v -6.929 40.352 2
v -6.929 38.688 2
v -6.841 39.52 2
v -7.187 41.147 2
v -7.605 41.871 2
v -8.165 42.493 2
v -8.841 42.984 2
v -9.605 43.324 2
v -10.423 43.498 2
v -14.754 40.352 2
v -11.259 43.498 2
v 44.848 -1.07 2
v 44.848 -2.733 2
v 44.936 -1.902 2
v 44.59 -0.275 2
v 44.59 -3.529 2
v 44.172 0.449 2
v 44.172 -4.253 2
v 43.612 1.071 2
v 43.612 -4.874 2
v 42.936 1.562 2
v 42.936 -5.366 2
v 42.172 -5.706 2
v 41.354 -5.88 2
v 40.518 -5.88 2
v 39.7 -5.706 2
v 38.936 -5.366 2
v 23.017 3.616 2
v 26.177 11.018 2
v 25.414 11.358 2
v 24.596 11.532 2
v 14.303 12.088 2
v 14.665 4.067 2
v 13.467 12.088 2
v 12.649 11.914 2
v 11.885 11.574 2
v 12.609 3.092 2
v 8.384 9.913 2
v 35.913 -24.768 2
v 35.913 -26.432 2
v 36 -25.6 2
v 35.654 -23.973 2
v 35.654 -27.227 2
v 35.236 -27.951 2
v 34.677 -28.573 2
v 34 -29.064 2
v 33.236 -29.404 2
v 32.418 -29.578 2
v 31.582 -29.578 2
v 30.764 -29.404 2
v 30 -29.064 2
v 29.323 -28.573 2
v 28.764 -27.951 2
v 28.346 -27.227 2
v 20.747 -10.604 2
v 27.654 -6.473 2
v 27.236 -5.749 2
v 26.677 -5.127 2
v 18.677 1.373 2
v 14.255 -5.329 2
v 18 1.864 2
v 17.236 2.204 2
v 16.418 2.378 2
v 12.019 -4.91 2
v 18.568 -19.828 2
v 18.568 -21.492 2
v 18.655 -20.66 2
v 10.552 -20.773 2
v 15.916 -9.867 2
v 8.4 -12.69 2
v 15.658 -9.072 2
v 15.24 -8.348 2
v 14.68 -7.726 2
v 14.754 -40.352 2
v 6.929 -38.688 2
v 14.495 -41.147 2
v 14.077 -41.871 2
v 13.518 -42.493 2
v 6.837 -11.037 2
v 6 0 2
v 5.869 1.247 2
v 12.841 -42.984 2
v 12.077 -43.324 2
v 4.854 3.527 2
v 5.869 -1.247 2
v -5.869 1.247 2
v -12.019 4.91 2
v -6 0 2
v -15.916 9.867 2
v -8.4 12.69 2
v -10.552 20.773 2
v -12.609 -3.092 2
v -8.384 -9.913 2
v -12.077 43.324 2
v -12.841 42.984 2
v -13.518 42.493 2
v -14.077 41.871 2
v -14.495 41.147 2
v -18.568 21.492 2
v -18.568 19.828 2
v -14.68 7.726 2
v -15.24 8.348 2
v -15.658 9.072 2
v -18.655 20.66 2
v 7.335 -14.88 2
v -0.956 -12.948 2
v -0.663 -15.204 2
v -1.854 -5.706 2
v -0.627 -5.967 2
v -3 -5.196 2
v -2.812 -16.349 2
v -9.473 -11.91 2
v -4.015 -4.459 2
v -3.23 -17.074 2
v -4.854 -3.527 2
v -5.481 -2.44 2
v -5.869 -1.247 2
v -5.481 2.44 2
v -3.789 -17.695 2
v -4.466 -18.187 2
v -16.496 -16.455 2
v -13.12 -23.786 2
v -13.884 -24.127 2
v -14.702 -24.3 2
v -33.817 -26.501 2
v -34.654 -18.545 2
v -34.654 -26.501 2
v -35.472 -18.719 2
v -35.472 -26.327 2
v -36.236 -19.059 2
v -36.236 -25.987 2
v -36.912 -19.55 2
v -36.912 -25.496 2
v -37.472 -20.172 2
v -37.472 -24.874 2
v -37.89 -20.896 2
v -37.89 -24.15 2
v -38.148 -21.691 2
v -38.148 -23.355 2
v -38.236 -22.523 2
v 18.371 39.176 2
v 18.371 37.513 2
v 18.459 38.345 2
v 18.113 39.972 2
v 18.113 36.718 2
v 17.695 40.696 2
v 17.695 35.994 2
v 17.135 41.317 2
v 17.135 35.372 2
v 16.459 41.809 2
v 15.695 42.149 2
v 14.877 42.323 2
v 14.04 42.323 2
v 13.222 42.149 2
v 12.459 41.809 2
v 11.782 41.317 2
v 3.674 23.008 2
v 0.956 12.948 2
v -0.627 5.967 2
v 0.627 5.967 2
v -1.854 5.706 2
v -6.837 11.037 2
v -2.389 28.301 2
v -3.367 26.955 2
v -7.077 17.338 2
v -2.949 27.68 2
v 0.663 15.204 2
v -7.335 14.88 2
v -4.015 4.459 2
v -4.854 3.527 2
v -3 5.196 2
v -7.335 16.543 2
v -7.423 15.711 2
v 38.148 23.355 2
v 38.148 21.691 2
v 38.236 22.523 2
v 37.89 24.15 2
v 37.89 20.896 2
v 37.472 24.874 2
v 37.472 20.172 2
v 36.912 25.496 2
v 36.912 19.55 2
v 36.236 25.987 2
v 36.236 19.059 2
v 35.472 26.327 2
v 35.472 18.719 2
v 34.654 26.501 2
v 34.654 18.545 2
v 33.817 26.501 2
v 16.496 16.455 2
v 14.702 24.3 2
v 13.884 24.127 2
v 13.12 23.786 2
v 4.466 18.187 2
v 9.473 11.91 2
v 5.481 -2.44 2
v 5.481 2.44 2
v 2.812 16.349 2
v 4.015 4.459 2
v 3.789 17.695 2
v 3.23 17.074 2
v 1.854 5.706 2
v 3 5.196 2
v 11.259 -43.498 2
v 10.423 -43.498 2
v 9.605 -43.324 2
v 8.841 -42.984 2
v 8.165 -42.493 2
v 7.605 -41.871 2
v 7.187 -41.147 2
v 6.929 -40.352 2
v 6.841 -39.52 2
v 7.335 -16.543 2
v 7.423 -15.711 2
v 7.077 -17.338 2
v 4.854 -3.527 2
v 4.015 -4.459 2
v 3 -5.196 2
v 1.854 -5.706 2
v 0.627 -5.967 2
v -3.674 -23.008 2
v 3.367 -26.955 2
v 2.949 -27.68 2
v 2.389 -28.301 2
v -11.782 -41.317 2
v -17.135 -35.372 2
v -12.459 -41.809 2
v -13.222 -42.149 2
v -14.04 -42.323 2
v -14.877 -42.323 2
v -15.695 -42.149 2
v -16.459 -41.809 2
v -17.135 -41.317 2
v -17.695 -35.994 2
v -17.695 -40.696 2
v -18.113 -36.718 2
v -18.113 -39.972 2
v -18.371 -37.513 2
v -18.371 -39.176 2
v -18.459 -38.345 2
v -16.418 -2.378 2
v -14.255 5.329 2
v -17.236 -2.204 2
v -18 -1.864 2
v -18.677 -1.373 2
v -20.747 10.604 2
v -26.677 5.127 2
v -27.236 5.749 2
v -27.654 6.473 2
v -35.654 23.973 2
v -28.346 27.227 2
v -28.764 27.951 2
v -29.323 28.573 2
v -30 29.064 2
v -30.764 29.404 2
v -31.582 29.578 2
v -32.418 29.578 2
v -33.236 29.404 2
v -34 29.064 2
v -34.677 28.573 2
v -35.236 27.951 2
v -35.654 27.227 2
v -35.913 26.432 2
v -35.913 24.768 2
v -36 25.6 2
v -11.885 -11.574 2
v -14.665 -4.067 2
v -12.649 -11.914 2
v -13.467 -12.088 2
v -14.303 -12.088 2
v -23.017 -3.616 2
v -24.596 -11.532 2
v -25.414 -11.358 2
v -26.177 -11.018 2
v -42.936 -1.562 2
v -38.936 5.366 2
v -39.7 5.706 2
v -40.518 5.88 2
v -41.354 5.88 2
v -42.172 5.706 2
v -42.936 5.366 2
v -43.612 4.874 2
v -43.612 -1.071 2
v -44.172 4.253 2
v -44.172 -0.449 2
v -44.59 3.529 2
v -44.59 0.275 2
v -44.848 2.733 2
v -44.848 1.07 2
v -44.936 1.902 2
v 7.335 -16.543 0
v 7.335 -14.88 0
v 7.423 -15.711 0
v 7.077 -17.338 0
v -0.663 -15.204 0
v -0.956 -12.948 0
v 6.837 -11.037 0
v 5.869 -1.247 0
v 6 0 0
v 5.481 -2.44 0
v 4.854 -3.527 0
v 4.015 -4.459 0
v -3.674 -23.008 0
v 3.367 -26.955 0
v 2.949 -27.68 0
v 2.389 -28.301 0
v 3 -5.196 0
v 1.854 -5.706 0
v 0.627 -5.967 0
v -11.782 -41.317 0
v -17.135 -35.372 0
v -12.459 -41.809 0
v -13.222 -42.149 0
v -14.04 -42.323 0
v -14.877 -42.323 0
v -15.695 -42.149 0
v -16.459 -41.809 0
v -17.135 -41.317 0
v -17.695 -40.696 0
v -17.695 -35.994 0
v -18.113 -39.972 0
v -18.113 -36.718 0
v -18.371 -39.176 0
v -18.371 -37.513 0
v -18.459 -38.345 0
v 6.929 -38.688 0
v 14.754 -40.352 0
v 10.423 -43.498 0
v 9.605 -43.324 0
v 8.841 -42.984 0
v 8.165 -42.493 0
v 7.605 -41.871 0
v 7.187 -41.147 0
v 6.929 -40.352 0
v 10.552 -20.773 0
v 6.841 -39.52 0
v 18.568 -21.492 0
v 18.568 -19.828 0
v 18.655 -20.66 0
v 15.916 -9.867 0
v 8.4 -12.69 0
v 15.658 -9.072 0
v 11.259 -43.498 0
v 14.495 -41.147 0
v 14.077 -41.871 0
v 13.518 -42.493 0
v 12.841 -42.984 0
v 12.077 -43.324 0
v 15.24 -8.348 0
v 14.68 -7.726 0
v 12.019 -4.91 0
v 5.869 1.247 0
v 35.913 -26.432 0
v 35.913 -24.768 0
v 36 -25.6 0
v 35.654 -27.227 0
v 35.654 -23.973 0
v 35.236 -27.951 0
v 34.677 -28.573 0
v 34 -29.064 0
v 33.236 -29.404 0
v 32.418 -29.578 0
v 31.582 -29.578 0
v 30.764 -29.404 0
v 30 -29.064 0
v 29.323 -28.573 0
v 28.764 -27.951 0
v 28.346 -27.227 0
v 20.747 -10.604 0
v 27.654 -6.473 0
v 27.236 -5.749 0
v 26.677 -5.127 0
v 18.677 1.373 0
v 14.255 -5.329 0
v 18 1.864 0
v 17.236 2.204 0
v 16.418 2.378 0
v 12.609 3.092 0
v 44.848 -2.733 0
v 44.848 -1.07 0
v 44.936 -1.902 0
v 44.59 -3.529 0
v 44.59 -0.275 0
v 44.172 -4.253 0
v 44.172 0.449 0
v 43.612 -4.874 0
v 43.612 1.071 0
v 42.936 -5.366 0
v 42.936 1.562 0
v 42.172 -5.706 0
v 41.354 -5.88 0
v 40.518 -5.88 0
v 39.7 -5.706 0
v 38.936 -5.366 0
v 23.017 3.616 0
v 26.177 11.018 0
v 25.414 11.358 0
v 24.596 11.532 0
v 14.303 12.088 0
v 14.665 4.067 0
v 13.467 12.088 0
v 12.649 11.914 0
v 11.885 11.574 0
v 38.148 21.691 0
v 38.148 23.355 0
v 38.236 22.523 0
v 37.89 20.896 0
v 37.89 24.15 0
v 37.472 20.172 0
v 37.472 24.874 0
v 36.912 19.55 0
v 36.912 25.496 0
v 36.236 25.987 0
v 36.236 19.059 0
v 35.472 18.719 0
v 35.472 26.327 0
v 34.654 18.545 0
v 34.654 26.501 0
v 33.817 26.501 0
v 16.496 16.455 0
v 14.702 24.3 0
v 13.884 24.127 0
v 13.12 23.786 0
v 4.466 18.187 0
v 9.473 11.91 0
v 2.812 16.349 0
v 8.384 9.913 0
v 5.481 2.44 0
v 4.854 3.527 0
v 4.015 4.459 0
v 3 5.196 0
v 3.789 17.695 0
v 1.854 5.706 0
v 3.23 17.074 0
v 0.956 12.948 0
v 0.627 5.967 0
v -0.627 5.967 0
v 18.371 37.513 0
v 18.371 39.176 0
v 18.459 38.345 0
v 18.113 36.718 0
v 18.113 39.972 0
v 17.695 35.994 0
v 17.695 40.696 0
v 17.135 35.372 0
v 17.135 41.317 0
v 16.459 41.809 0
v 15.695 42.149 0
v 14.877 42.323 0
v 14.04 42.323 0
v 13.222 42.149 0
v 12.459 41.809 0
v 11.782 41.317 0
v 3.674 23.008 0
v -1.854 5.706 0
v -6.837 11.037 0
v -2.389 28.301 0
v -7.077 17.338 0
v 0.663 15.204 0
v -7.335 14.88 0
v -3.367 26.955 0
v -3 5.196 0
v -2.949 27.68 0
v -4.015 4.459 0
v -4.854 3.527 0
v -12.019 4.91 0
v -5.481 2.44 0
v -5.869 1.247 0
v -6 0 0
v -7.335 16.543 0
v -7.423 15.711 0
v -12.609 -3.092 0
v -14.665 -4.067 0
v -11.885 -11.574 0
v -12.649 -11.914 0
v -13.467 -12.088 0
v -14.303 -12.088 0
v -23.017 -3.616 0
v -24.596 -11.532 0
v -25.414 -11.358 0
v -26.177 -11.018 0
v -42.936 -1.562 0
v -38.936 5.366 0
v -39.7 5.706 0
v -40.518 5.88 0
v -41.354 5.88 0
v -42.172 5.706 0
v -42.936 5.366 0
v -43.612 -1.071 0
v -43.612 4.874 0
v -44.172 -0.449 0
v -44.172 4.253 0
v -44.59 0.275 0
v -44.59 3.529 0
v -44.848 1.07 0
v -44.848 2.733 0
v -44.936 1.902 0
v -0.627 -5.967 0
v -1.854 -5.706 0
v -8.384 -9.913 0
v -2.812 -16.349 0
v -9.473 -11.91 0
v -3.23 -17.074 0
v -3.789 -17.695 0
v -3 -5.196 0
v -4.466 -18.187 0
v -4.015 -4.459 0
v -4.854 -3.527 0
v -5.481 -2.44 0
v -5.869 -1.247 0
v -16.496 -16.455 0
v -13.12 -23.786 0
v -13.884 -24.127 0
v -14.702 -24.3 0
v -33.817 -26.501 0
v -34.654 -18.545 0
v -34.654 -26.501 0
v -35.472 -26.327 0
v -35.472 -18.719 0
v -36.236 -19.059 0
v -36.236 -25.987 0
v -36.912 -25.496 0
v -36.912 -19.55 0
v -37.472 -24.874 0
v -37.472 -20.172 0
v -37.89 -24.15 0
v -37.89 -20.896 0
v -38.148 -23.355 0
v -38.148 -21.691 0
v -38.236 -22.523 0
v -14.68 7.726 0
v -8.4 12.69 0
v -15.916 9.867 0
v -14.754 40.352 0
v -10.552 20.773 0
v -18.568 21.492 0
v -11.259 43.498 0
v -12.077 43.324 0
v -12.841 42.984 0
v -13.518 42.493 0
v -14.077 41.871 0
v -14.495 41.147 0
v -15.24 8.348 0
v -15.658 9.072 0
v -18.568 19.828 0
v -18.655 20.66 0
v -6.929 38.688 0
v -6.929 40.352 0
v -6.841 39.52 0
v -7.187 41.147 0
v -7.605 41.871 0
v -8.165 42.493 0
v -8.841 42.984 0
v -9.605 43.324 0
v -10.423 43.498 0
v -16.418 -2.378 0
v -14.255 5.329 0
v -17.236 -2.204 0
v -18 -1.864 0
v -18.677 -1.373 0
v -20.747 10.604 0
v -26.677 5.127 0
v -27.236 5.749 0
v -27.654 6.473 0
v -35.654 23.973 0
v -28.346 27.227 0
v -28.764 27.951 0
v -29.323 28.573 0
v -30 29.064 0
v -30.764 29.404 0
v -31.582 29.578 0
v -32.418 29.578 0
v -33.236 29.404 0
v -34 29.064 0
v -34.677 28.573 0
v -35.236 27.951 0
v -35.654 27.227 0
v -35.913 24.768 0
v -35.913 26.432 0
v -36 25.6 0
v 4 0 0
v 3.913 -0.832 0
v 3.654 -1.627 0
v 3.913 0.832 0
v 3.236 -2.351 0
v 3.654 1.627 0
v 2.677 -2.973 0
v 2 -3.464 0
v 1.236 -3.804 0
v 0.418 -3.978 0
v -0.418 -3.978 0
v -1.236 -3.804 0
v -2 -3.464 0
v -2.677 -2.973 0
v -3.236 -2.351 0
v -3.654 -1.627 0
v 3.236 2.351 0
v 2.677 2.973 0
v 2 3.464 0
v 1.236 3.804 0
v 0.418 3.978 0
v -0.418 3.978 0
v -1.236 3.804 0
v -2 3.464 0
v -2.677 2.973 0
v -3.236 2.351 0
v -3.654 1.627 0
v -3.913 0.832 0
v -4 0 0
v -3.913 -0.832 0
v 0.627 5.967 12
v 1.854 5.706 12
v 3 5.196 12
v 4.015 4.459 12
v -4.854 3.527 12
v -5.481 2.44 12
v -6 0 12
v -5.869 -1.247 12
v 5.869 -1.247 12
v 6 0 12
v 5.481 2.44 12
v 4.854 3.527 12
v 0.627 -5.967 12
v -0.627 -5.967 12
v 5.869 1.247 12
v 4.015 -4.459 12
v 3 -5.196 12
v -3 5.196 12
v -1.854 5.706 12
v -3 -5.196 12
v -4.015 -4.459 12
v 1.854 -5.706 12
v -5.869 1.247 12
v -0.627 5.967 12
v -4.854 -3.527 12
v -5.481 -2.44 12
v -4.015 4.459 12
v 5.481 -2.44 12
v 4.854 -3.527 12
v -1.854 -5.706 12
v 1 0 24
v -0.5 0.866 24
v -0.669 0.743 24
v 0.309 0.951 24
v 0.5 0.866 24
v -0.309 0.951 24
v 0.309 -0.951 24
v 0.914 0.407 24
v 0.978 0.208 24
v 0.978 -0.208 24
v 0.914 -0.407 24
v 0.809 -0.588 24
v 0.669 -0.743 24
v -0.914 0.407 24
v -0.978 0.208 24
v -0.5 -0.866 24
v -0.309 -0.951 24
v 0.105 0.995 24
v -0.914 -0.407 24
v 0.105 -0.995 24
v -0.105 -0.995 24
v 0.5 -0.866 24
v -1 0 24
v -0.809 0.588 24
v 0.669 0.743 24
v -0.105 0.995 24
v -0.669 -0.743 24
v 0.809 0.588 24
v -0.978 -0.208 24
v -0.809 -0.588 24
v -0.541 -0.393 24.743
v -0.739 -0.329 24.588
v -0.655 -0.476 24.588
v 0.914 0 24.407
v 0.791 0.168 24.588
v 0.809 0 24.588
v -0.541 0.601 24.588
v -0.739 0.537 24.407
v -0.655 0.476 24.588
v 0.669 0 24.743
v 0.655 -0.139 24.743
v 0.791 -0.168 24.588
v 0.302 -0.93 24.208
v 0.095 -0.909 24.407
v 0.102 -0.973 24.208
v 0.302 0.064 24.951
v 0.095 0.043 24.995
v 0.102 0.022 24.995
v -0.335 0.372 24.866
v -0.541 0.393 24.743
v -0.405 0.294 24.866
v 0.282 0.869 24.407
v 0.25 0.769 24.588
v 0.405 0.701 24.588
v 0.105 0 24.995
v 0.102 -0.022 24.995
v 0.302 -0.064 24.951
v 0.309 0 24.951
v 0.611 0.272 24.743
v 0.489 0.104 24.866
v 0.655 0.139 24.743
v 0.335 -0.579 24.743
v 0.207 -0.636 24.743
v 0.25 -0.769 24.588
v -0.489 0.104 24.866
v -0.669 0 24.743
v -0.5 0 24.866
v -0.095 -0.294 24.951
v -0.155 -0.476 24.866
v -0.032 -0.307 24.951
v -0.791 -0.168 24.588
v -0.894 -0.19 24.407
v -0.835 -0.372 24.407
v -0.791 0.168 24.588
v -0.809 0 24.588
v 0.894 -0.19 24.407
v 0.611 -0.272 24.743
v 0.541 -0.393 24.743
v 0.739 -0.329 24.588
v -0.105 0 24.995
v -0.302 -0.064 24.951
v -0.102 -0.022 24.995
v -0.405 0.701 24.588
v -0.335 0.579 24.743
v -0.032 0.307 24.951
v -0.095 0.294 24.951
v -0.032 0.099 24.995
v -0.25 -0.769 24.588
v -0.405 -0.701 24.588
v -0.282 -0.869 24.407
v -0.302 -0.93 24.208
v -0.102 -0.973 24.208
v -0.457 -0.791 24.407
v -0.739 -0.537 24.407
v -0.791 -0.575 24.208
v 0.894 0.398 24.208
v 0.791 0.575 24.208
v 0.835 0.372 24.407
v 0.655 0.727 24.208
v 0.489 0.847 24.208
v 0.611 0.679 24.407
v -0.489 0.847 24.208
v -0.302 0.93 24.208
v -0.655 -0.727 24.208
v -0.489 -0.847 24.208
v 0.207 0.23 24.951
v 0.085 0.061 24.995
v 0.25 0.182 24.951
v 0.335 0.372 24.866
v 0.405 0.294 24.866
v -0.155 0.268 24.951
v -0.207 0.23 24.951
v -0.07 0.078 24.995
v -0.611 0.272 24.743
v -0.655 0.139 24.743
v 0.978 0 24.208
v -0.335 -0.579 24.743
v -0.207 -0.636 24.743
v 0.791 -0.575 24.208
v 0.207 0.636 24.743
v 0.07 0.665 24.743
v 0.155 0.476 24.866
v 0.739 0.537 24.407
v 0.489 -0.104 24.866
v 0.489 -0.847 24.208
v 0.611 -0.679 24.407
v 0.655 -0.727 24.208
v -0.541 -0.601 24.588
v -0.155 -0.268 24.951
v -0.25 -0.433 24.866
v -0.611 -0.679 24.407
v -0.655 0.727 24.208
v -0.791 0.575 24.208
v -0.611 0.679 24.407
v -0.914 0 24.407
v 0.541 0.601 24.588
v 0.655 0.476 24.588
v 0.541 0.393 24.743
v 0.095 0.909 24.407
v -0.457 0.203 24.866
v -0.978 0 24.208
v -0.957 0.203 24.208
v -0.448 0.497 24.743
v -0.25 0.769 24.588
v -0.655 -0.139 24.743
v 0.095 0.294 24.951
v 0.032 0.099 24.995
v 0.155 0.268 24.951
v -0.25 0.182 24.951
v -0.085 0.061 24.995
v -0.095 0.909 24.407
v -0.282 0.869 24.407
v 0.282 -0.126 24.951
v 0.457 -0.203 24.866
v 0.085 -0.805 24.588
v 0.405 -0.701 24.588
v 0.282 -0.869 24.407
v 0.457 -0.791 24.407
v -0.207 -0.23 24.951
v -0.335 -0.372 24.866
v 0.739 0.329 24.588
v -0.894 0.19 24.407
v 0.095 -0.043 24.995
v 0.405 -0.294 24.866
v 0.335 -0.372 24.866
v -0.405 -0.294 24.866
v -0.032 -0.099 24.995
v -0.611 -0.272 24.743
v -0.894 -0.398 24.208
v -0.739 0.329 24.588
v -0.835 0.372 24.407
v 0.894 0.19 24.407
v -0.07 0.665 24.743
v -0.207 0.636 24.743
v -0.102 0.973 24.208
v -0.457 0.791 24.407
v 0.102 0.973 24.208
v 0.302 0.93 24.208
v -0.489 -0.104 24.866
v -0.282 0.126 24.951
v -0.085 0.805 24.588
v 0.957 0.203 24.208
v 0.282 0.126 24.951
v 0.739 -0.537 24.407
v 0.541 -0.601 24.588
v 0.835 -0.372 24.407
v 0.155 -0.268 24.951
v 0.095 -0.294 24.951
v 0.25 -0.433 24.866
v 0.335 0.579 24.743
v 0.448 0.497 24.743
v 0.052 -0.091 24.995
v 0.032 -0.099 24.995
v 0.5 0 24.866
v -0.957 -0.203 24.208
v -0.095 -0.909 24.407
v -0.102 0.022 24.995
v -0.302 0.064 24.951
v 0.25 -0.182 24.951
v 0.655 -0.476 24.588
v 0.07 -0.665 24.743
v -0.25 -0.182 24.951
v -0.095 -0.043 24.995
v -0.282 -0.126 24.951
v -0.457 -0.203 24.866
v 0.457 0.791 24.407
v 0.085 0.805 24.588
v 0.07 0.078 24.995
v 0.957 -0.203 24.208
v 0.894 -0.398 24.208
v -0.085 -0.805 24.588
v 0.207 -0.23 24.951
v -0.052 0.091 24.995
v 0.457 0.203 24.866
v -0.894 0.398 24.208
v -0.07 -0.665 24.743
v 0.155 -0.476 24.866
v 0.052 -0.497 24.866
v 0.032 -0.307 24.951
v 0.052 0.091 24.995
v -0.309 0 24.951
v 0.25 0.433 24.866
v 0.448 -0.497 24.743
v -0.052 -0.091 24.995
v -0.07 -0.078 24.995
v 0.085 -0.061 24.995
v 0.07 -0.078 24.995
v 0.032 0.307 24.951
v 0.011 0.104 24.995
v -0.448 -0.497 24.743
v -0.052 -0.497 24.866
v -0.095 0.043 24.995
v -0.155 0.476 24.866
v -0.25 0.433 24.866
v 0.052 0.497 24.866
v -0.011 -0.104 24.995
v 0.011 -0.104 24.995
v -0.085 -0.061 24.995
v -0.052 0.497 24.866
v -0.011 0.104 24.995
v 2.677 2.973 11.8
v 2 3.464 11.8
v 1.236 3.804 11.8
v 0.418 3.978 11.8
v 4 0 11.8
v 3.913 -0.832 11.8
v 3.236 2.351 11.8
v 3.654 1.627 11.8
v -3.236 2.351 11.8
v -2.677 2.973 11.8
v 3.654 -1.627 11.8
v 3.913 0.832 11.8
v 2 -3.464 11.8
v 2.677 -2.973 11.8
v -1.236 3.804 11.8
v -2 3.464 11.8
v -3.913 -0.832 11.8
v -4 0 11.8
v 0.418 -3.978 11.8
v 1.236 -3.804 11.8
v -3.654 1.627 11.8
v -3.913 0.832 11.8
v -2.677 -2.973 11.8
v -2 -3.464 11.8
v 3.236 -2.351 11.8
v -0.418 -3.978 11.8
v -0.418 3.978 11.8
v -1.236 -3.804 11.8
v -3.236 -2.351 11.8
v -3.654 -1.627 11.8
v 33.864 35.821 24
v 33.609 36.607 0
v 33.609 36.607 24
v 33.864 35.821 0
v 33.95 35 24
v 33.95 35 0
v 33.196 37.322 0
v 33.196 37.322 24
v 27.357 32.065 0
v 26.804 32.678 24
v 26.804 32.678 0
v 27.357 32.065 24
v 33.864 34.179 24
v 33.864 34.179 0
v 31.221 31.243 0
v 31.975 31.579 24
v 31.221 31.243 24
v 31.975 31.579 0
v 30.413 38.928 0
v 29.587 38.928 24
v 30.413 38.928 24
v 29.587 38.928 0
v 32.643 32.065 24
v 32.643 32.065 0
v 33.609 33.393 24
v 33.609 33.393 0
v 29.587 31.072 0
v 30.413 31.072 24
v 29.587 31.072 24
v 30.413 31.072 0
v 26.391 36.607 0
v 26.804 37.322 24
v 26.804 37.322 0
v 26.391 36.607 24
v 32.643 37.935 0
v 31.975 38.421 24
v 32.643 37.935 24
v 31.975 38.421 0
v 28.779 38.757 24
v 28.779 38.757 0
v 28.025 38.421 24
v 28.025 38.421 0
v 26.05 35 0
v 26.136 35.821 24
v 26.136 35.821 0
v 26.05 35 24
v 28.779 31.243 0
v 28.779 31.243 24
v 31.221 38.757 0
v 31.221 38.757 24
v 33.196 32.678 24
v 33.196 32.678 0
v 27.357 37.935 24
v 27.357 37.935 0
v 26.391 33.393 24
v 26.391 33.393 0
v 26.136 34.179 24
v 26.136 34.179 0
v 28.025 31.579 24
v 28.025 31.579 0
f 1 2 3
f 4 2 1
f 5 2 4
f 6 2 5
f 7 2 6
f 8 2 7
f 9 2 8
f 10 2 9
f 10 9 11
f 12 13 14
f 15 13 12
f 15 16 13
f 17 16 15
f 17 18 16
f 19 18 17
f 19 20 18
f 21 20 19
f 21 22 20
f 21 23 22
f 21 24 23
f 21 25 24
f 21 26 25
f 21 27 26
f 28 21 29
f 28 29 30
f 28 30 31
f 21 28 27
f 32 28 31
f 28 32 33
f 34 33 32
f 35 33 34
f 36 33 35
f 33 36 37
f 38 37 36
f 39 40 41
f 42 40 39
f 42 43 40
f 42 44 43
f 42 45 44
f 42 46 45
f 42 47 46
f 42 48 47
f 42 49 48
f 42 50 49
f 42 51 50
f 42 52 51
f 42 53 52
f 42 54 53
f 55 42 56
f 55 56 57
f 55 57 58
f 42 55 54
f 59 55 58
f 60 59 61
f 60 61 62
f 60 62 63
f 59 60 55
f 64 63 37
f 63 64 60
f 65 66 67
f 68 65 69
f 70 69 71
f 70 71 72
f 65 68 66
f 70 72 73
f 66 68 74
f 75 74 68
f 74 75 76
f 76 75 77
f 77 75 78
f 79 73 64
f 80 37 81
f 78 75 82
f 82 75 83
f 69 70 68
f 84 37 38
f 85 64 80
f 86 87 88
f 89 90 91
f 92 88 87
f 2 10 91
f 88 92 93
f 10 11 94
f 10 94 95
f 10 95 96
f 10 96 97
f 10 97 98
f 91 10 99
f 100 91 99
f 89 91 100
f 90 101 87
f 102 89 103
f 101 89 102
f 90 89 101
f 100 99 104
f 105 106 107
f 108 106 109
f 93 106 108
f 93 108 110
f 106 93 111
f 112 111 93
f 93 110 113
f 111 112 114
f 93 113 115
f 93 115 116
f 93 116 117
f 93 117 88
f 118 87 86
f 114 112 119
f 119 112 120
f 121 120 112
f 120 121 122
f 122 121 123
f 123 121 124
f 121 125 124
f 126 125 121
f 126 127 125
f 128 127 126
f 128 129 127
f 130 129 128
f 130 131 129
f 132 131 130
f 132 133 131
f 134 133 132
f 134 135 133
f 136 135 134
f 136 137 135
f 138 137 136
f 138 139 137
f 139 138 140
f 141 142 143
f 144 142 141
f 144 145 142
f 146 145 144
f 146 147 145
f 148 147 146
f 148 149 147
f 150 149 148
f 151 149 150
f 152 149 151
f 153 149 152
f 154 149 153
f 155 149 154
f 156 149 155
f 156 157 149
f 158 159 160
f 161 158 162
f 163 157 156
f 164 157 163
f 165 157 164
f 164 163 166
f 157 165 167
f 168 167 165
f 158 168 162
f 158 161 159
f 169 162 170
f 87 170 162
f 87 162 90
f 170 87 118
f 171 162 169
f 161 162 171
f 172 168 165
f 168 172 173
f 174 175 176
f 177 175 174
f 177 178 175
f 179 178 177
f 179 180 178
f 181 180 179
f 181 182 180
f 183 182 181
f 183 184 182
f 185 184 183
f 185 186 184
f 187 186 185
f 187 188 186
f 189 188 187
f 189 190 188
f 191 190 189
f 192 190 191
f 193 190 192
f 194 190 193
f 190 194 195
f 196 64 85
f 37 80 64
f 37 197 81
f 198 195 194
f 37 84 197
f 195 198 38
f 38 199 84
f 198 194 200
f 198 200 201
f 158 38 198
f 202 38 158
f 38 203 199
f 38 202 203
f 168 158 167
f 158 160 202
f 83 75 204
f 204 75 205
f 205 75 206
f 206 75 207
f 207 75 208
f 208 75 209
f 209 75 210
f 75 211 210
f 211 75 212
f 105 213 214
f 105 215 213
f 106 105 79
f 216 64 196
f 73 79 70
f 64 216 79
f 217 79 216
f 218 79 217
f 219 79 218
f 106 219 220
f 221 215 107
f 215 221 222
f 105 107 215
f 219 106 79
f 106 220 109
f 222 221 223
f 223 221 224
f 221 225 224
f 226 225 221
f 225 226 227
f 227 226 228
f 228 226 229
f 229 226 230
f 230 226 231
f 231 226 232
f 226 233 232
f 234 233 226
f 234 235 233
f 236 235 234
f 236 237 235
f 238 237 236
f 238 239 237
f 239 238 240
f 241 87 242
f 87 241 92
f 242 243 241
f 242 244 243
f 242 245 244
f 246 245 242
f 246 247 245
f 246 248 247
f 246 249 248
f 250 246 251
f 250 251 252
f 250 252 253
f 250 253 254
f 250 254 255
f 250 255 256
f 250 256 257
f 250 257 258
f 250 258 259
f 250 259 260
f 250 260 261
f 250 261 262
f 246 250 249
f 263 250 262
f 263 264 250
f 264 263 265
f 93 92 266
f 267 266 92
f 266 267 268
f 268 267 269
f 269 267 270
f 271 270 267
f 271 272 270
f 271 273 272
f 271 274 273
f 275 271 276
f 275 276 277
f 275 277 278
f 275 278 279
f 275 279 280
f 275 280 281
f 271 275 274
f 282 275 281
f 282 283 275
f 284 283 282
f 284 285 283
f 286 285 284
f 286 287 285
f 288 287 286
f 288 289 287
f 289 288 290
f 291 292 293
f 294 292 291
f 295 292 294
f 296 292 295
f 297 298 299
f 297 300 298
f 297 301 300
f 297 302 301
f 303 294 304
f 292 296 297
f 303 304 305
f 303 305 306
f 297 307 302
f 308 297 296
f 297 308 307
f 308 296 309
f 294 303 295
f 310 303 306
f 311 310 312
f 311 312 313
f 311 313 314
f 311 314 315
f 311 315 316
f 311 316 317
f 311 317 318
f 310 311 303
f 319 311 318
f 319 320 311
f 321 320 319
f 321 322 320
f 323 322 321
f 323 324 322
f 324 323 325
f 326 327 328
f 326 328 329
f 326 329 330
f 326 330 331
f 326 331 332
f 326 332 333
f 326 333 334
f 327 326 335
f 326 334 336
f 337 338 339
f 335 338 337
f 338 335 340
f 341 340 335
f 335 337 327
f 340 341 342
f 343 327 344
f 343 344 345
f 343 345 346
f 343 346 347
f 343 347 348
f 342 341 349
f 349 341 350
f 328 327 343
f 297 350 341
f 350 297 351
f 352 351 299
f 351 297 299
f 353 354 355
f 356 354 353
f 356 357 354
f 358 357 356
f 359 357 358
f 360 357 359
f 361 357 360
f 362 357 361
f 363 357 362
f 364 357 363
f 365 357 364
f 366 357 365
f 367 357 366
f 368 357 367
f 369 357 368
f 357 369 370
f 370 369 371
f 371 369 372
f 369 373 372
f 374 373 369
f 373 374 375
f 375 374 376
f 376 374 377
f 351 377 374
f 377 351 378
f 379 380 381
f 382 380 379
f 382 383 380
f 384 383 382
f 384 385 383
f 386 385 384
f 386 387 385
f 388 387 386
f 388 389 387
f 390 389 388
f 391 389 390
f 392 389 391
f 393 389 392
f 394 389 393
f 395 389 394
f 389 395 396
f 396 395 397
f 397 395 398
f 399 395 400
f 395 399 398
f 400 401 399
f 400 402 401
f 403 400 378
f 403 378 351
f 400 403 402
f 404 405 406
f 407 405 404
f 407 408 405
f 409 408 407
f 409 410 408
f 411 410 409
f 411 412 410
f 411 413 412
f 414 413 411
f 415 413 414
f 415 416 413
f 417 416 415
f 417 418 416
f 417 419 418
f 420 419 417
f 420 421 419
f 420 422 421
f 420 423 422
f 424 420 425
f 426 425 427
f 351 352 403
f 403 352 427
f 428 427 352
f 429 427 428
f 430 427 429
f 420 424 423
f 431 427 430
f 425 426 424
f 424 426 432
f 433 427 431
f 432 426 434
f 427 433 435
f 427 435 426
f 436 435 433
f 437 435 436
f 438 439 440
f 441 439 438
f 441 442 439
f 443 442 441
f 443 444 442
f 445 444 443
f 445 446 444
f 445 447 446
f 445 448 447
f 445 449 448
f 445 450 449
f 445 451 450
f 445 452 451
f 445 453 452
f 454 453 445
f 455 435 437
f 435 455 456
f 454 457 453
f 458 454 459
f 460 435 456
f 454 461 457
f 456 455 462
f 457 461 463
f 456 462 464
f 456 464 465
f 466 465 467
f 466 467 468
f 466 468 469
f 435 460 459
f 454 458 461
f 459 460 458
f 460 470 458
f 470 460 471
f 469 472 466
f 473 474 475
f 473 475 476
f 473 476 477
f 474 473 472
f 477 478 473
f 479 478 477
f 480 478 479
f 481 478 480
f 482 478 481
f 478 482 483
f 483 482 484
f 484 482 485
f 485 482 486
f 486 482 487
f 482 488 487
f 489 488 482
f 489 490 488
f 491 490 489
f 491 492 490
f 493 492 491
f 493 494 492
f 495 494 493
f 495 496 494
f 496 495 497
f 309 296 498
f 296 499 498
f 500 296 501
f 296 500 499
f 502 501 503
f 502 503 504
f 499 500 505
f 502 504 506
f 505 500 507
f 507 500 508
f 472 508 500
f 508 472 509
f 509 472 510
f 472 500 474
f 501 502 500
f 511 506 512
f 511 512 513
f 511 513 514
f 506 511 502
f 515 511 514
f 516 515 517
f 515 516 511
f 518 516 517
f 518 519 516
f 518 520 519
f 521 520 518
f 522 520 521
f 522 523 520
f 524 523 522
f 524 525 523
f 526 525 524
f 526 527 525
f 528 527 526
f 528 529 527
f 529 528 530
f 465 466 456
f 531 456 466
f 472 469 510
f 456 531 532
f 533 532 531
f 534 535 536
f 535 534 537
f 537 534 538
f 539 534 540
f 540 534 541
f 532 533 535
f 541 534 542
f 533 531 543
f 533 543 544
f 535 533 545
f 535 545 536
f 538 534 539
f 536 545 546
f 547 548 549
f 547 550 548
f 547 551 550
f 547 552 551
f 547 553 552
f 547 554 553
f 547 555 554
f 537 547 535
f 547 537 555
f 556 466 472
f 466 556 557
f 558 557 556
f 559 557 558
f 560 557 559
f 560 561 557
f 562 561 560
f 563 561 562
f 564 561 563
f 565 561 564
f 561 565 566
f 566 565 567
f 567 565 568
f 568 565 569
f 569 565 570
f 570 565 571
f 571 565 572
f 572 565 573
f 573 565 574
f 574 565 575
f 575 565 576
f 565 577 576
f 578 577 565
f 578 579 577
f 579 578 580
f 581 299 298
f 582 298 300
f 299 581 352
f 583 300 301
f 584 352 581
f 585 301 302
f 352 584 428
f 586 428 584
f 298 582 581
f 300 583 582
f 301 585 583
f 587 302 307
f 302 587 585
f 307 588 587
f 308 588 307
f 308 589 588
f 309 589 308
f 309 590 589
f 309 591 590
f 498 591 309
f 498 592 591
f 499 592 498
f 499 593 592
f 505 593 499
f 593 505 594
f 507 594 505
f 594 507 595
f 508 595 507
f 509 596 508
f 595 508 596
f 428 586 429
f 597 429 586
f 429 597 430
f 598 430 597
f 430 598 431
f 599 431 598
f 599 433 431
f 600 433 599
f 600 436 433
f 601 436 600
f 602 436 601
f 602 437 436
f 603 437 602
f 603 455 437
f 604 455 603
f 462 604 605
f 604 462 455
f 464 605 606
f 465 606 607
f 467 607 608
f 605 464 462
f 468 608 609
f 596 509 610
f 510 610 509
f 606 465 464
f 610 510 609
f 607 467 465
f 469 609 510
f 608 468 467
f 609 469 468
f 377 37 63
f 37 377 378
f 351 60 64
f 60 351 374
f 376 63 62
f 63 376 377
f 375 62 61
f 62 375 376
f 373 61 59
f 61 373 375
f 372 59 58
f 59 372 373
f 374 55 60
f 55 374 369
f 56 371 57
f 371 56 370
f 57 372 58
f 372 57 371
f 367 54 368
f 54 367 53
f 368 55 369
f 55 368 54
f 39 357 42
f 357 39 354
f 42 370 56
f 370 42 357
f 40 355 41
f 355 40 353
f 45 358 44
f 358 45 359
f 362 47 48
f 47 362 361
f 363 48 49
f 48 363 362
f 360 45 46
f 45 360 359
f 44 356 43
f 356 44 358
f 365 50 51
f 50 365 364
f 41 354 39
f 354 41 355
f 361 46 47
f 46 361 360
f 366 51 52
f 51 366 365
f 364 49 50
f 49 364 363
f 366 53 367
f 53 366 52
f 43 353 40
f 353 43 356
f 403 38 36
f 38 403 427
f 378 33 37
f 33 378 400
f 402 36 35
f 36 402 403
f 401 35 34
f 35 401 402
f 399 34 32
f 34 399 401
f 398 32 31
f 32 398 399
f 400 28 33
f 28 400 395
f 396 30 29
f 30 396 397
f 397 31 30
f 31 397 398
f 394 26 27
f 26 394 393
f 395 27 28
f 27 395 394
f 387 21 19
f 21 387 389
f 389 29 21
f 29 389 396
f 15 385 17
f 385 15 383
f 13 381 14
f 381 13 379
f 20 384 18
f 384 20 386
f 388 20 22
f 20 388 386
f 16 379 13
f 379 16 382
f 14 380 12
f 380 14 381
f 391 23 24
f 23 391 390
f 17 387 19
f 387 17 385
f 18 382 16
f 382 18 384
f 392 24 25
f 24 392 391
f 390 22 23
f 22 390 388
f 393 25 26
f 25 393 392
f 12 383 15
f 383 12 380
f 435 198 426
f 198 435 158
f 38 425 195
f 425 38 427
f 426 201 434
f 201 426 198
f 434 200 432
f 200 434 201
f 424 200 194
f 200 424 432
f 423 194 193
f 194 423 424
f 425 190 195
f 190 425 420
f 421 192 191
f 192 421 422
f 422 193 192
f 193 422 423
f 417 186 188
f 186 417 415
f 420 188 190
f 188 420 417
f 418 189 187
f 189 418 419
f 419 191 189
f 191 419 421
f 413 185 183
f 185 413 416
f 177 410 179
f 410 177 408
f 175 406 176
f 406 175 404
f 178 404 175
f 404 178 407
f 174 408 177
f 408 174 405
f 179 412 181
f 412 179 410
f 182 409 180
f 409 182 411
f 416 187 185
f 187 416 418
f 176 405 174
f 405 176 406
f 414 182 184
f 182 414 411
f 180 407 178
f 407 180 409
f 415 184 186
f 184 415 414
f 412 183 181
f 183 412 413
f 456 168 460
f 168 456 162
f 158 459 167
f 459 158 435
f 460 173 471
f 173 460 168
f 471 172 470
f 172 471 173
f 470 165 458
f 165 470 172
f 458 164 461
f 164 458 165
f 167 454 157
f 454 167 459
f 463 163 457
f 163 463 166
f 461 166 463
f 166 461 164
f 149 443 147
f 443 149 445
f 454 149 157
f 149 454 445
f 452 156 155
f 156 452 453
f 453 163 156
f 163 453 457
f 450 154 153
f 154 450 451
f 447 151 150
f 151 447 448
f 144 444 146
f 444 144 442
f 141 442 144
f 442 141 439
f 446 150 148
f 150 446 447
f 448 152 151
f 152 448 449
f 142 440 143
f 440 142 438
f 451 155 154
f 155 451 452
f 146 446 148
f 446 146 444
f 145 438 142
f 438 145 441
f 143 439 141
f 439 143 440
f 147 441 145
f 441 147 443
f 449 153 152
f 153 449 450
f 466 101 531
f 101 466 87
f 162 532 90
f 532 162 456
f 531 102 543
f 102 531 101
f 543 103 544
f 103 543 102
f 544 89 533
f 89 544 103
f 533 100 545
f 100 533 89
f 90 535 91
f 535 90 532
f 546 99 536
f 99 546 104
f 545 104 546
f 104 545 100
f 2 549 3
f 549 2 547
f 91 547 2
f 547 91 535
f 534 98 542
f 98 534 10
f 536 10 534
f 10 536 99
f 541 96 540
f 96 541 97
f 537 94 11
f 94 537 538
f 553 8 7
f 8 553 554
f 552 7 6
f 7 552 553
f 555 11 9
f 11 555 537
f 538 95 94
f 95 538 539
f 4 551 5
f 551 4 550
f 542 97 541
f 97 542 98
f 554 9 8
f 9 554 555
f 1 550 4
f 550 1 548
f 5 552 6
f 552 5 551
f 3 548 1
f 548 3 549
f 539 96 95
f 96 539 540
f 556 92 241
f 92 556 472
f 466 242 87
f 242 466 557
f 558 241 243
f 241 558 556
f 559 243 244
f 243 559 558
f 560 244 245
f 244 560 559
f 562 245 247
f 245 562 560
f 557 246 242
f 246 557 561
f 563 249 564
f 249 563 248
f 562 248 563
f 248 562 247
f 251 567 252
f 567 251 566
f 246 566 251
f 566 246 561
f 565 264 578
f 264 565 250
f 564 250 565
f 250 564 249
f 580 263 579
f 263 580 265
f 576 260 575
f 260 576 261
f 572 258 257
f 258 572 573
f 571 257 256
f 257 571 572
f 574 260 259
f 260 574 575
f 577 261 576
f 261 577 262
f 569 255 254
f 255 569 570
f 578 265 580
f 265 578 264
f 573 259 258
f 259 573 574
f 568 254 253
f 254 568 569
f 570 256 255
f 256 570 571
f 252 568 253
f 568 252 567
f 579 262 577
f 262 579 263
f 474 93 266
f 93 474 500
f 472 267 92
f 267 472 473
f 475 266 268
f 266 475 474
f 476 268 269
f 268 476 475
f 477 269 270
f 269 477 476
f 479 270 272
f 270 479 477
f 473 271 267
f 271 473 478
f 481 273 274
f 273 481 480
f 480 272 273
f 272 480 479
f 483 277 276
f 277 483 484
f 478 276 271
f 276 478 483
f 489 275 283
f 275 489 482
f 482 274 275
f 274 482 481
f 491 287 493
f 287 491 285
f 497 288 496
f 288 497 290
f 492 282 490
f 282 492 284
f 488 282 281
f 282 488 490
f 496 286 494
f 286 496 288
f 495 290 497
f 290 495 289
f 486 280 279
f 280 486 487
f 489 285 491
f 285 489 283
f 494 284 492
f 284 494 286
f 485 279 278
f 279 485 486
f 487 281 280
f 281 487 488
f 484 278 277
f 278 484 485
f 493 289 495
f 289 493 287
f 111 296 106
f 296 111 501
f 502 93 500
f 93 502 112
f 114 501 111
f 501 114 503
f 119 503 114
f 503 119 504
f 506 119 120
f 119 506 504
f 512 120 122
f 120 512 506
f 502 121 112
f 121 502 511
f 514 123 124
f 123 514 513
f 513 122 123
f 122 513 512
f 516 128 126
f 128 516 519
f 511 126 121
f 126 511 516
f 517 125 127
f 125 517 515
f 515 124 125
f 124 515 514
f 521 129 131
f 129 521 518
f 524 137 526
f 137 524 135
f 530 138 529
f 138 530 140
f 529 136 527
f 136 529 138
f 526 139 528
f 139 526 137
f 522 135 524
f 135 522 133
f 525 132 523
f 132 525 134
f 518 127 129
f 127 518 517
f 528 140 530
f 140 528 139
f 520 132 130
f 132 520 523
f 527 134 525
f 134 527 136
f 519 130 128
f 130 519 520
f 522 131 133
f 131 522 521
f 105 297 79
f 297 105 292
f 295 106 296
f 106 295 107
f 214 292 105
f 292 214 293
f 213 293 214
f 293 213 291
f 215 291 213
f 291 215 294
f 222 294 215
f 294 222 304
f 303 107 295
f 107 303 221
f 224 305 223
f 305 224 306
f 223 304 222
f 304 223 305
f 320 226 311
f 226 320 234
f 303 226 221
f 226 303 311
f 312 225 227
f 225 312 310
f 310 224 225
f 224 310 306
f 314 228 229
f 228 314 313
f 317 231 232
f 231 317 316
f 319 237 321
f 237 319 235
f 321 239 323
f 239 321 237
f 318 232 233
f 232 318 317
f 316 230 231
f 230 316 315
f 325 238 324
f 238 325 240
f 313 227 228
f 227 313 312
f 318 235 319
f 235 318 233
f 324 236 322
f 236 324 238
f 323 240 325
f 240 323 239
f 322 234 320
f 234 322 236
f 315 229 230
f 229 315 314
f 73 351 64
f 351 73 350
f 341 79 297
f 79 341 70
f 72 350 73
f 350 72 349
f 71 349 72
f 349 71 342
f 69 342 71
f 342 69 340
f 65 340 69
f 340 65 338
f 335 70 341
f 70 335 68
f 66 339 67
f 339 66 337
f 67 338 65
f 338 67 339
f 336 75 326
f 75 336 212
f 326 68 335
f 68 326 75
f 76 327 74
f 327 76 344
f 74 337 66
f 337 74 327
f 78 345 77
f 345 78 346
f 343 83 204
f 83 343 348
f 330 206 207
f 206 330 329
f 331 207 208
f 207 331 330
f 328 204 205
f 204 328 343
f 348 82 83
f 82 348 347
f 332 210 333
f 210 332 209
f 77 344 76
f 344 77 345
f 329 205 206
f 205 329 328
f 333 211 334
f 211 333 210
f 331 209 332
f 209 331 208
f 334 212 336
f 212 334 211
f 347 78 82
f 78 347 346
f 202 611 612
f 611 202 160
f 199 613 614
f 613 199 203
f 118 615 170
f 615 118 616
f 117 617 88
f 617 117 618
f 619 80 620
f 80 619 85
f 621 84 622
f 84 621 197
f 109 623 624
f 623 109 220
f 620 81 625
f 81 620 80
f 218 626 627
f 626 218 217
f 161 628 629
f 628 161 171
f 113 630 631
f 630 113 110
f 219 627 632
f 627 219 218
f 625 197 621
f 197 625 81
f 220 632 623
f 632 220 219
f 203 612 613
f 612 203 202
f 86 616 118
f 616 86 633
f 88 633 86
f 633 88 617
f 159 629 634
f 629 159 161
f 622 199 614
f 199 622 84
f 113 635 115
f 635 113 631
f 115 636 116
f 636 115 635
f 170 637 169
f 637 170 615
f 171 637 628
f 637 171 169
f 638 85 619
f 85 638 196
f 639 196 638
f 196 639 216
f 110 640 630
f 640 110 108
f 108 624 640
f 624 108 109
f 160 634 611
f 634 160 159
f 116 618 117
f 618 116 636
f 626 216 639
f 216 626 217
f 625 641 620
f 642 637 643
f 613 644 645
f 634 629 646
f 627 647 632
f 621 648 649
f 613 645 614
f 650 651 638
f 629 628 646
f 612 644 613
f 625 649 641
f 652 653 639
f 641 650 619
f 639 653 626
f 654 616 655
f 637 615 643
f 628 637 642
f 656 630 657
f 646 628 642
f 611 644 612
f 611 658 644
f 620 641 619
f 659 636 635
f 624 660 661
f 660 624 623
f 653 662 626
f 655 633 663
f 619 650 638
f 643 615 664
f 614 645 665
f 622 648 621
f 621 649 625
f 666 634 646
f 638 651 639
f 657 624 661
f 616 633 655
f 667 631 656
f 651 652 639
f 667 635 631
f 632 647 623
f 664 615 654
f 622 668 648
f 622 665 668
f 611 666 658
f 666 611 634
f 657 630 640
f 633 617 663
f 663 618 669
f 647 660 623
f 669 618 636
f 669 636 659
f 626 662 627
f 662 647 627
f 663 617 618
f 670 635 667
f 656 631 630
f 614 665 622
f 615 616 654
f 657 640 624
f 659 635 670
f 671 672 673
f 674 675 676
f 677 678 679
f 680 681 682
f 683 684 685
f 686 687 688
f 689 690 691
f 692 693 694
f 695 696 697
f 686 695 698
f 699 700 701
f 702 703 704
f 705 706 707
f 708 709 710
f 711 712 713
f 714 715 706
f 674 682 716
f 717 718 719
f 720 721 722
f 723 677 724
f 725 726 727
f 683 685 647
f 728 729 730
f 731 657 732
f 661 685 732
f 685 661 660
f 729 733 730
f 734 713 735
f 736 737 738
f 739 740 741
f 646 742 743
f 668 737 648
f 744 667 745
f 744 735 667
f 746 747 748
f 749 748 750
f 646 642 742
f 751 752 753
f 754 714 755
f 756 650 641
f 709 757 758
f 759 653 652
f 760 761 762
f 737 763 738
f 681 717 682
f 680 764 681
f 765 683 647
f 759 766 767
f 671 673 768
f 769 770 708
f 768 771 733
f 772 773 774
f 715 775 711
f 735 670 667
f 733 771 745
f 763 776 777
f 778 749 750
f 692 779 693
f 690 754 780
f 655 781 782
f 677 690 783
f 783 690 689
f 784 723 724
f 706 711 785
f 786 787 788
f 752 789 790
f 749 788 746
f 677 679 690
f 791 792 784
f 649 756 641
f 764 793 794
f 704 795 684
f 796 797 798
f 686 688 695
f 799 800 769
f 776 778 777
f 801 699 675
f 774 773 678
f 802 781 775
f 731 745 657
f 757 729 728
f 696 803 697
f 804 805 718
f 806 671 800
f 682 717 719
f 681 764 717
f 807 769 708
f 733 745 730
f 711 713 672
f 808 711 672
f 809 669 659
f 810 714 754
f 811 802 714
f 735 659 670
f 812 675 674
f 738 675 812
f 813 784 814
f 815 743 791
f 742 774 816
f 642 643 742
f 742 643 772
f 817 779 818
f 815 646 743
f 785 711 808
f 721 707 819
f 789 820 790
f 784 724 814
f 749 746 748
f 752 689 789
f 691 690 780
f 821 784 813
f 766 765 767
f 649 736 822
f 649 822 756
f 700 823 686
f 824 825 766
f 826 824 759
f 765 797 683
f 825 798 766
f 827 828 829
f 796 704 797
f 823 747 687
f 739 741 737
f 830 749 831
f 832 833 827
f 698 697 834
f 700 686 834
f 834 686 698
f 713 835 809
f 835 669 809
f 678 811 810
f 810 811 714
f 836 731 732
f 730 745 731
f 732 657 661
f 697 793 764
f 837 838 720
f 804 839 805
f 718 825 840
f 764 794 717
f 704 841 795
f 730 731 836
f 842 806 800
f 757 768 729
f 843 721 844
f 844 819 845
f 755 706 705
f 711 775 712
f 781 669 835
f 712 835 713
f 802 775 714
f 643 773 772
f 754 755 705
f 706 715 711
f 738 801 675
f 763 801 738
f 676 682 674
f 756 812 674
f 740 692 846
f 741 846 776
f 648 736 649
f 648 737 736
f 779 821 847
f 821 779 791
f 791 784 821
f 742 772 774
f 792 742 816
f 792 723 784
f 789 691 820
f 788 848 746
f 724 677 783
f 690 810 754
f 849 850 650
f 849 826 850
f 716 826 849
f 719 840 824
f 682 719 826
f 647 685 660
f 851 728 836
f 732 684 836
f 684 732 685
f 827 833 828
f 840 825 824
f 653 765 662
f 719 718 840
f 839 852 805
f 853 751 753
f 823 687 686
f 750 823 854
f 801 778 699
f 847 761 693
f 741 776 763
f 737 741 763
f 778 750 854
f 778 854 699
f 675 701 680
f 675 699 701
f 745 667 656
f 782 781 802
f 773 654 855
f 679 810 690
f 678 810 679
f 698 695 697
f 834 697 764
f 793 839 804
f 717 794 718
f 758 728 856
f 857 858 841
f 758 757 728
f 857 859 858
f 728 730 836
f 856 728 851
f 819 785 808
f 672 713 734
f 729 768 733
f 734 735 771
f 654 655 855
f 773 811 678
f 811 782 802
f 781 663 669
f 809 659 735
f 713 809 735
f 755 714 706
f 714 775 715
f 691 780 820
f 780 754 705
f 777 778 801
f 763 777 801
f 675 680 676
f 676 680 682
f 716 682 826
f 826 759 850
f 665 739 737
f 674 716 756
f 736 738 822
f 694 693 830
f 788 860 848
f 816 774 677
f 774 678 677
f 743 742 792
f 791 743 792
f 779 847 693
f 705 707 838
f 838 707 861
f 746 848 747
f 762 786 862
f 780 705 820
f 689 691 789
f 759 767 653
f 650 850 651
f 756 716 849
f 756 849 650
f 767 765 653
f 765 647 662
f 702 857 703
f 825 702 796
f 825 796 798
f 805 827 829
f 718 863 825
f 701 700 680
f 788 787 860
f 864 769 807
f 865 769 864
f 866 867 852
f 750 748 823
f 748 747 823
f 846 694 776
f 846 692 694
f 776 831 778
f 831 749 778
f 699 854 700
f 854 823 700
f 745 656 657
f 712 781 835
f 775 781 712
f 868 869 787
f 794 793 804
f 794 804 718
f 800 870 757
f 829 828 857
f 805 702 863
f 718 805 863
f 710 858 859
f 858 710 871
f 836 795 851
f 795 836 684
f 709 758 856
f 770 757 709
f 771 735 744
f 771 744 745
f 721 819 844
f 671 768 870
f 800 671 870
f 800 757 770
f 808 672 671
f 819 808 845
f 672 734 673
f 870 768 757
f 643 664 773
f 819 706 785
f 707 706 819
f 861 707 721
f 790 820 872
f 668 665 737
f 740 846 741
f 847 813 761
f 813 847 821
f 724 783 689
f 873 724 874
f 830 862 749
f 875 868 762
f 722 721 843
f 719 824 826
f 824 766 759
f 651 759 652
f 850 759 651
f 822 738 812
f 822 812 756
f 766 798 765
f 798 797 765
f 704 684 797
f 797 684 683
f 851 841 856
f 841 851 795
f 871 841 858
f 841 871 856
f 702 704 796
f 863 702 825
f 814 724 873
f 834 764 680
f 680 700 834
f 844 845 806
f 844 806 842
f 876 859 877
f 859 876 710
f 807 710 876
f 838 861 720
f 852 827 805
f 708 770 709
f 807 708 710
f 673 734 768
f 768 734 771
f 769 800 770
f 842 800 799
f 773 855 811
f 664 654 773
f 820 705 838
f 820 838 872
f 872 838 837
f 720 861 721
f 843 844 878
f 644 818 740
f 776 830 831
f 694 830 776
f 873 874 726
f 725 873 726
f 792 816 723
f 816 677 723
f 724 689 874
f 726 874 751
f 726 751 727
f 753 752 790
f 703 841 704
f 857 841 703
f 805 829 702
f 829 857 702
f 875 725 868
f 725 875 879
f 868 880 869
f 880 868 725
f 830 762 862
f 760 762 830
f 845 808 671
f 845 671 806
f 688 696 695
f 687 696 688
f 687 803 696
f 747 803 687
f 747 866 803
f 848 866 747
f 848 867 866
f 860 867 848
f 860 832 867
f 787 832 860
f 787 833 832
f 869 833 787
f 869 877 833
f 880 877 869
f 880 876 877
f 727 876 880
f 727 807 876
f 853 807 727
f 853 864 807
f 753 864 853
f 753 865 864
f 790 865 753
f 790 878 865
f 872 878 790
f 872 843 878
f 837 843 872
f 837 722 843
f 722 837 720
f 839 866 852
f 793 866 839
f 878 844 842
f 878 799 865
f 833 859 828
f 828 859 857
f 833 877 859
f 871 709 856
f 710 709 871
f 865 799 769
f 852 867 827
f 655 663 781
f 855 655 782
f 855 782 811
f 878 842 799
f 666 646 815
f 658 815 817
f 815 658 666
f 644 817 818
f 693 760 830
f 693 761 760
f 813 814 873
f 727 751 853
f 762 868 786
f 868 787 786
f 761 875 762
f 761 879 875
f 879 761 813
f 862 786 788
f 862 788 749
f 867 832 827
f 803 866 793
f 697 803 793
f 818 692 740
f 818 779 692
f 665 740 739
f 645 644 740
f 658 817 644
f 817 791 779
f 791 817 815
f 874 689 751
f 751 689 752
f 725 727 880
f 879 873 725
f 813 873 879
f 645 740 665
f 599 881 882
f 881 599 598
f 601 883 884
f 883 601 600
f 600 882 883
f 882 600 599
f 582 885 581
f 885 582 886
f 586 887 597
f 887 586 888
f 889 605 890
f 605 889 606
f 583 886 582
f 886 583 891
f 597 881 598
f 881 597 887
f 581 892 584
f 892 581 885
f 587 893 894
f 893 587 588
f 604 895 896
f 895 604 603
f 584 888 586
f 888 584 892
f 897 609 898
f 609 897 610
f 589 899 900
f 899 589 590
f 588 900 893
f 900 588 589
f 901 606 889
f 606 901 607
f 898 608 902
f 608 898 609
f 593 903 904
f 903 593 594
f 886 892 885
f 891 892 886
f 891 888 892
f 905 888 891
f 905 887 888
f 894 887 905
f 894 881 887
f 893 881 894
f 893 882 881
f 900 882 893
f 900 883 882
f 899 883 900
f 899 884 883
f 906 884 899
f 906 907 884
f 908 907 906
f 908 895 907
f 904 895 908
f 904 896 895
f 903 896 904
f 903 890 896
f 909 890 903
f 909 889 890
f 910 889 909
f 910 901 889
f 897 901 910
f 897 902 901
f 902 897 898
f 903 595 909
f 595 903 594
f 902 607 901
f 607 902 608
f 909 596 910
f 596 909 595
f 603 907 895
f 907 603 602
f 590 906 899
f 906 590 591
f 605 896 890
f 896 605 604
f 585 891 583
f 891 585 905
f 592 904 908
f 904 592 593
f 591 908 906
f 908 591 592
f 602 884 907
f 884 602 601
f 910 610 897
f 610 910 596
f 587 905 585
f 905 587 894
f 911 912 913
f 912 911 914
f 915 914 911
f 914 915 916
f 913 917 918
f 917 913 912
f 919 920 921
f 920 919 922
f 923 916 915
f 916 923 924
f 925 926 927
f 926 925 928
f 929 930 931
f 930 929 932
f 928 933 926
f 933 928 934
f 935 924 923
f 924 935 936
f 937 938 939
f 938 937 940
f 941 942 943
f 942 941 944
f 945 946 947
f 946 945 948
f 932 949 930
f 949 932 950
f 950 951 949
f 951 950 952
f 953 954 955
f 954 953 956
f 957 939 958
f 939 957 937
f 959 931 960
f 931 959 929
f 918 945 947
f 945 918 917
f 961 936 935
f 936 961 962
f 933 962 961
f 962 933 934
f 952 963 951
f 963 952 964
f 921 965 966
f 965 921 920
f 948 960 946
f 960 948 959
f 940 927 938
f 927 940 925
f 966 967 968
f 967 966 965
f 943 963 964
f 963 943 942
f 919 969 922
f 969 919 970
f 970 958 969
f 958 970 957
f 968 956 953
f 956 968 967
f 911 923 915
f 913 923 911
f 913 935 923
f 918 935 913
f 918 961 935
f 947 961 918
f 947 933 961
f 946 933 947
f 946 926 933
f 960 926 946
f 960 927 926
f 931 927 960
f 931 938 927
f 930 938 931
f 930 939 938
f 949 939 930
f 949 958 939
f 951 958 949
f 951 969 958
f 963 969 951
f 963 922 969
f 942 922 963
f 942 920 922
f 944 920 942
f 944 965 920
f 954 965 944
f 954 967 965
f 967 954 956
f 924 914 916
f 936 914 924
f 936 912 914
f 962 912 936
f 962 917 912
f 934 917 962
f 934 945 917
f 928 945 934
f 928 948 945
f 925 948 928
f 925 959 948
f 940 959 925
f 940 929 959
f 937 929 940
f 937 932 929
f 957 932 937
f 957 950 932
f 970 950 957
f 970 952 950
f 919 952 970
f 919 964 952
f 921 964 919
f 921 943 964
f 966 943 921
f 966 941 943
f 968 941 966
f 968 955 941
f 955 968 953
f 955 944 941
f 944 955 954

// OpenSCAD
//!OpenSCAD

/* 
Simple spinning top, with a kind of flower form(s)
Made by Daniel K. Schneider
TECFA, University of Geneva
License: Creative Commons - BY-NC-SA

There are several parameters you can change. See the end of the file

*/

$fn=30;

// Play with the parameters below. E.g., start with number of petals. A number between 2 and 15 maybe.
n_petals = 10;
// Choose between 3 models for the petals: quadratic, square or linear/straight.
model_number = 1;
// Building block of a petal. Each petal is defined as a string of block with a "hull" around it.
block_width = 4;
// Building block of a petal. Height should be anything that is printable, e.g. between 0.5 and 20.
block_height = 2;
// Radius of the hub. A good value is 10, i.e. a width of 2cm.
hub_radius = 6;
// Radius of the hole. 4-5 mm is about the size of a pen. Must be at least 1.5 smaller than radius.
hole_radius = 4;
// A small tip will enhance spinning time. A large tip encourages some "walking".
tip_radius = 1;
// Height of the hub in the middle. Something between 5 and 30 ?
hub_height = 24;
// Petal length in terms of blocks. Try between 2 and 10.
N_petal_blocks = 4;
// Height of the stick to be inserted into the hole. Chose anything that allows grabbing it.
stick_height = 1 * hub_height;
// Radius of the stick. Must be equal or small than hole_radius
stick_radius = hole_radius - 0.05;
// Since you also can use the top up-side-down, you can try a what happens if you got a flat stick. Alternatively, just insert the round end into the hole.
rounded_stick = false;
// set the x position of the removable stick
stick_position_x = 30;
// set the y position of the stick
stick_position_y = 35;


union(){
  difference() {
    create_flower();

    create_hole();
  }
  create_stick();
}


module create_flower() {
  deg_petals = 360 / n_petals;
  hub_half_height = hub_height / 2;
  // Flower without the hole. It has a three-part hub plus petals.
  union(){
    // The lower part of the hub- lower part
    cylinder(r1=hub_radius, r2=hub_radius, h=hub_half_height, center=false);
    translate([0, 0, hub_half_height]){
      // The lower part of the hub, upper part
      cylinder(r1=hub_radius, r2=tip_radius, h=hub_half_height, center=false);
    }
    translate([0, 0, hub_height]){
      // hub tip, a ball
      sphere(r=tip_radius);
    }
    // Loop to create N petals. Each  one is rotated
    for (rot = [0 : abs(deg_petals) : 360 - deg_petals]) {
      if (model_number == 1) {
        create_petal(rot);
      } else if (model_number == 2) {
        create_petal2(rot);
      } else {
        create_petal3(rot);
      }

    }

  }
}

module create_hole() {
  hub_half_height = hub_height / 2;
  // Three objects that will be subtracted to create the hole. One stick plus a ball on top. The cylinder at the bottom will shave off stuff that inhibits 3D printing.
  union(){
    translate([0, 0, (-0.2 - hub_half_height)]){
      cylinder(r1=hole_radius, r2=hole_radius, h=hub_height, center=false);
    }
    translate([0, 0, (0 - 3 * hub_half_height)]){
      cylinder(r1=hub_radius, r2=hub_radius, h=(3 * hub_half_height), center=false);
    }
  }
}

module create_stick() {
  // Stick to insert into the hole. Sorry you got to find a good position for this manually. Change x and y values if needed. 2
  translate([stick_position_x, stick_position_y, 0]){
    union(){
      cylinder(r1=stick_radius, r2=stick_radius, h=stick_height, center=false);
      if (rounded_stick) {
        translate([0, 0, stick_height]){
          sphere(r=stick_radius);
        }
      }

    }
  }
}

module create_petal(rotation) {
  rotate([0, 0, rotation]){
    // Untick hull for a postmodern experience...
    // chain hull
    for (pos = [0 : abs(1) : N_petal_blocks - 1]) {
      hull() {
      // This formula  will create a curved line. You can try others....
      translate([(pos * (2 * block_width)), (pow(pos, 4) * -0.1), 0]){
        cylinder(r1=block_width, r2=block_width, h=block_height, center=false);
      }
      // This formula  will create a curved line. You can try others....
      translate([((pos + 1) * (2 * block_width)), (pow((pos + 1), 4) * -0.1), 0]){
        cylinder(r1=block_width, r2=block_width, h=block_height, center=false);
      }
      }  // end hull (in loop)
     } // end loop

  }
}

module create_petal2(rotation) {
  rotate([0, 0, rotation]){
    // Untick hull for a postmodern experience...
    // chain hull
    for (pos = [0 : abs(1) : N_petal_blocks - 1]) {
      hull() {
      // This formula  will create a curved line. You can try others....
      translate([(pos * (2 * block_width)), (pow(pos, 2) * 1), 0]){
        cylinder(r1=block_width, r2=block_width, h=block_height, center=false);
      }
      // This formula  will create a curved line. You can try others....
      translate([((pos + 1) * (2 * block_width)), (pow((pos + 1), 2) * 1), 0]){
        cylinder(r1=block_width, r2=block_width, h=block_height, center=false);
      }
      }  // end hull (in loop)
     } // end loop

  }
}

module create_petal3(rotation) {
  rotate([0, 0, rotation]){
    // Untick hull for a postmodern experience...
    // chain hull
    for (pos = [0 : abs(1) : N_petal_blocks - 1]) {
      hull() {
      // This formula  will create a curved line. You can try others....
      translate([(pos * (1 * block_width)), (pos * (1 * block_width)), 0]){
        cylinder(r1=block_width, r2=block_width, h=block_height, center=false);
      }
      // This formula  will create a curved line. You can try others....
      translate([((pos + 1) * (1 * block_width)), ((pos + 1) * (1 * block_width)), 0]){
        cylinder(r1=block_width, r2=block_width, h=block_height, center=false);
      }
      }  // end hull (in loop)
     } // end loop

  }
}
